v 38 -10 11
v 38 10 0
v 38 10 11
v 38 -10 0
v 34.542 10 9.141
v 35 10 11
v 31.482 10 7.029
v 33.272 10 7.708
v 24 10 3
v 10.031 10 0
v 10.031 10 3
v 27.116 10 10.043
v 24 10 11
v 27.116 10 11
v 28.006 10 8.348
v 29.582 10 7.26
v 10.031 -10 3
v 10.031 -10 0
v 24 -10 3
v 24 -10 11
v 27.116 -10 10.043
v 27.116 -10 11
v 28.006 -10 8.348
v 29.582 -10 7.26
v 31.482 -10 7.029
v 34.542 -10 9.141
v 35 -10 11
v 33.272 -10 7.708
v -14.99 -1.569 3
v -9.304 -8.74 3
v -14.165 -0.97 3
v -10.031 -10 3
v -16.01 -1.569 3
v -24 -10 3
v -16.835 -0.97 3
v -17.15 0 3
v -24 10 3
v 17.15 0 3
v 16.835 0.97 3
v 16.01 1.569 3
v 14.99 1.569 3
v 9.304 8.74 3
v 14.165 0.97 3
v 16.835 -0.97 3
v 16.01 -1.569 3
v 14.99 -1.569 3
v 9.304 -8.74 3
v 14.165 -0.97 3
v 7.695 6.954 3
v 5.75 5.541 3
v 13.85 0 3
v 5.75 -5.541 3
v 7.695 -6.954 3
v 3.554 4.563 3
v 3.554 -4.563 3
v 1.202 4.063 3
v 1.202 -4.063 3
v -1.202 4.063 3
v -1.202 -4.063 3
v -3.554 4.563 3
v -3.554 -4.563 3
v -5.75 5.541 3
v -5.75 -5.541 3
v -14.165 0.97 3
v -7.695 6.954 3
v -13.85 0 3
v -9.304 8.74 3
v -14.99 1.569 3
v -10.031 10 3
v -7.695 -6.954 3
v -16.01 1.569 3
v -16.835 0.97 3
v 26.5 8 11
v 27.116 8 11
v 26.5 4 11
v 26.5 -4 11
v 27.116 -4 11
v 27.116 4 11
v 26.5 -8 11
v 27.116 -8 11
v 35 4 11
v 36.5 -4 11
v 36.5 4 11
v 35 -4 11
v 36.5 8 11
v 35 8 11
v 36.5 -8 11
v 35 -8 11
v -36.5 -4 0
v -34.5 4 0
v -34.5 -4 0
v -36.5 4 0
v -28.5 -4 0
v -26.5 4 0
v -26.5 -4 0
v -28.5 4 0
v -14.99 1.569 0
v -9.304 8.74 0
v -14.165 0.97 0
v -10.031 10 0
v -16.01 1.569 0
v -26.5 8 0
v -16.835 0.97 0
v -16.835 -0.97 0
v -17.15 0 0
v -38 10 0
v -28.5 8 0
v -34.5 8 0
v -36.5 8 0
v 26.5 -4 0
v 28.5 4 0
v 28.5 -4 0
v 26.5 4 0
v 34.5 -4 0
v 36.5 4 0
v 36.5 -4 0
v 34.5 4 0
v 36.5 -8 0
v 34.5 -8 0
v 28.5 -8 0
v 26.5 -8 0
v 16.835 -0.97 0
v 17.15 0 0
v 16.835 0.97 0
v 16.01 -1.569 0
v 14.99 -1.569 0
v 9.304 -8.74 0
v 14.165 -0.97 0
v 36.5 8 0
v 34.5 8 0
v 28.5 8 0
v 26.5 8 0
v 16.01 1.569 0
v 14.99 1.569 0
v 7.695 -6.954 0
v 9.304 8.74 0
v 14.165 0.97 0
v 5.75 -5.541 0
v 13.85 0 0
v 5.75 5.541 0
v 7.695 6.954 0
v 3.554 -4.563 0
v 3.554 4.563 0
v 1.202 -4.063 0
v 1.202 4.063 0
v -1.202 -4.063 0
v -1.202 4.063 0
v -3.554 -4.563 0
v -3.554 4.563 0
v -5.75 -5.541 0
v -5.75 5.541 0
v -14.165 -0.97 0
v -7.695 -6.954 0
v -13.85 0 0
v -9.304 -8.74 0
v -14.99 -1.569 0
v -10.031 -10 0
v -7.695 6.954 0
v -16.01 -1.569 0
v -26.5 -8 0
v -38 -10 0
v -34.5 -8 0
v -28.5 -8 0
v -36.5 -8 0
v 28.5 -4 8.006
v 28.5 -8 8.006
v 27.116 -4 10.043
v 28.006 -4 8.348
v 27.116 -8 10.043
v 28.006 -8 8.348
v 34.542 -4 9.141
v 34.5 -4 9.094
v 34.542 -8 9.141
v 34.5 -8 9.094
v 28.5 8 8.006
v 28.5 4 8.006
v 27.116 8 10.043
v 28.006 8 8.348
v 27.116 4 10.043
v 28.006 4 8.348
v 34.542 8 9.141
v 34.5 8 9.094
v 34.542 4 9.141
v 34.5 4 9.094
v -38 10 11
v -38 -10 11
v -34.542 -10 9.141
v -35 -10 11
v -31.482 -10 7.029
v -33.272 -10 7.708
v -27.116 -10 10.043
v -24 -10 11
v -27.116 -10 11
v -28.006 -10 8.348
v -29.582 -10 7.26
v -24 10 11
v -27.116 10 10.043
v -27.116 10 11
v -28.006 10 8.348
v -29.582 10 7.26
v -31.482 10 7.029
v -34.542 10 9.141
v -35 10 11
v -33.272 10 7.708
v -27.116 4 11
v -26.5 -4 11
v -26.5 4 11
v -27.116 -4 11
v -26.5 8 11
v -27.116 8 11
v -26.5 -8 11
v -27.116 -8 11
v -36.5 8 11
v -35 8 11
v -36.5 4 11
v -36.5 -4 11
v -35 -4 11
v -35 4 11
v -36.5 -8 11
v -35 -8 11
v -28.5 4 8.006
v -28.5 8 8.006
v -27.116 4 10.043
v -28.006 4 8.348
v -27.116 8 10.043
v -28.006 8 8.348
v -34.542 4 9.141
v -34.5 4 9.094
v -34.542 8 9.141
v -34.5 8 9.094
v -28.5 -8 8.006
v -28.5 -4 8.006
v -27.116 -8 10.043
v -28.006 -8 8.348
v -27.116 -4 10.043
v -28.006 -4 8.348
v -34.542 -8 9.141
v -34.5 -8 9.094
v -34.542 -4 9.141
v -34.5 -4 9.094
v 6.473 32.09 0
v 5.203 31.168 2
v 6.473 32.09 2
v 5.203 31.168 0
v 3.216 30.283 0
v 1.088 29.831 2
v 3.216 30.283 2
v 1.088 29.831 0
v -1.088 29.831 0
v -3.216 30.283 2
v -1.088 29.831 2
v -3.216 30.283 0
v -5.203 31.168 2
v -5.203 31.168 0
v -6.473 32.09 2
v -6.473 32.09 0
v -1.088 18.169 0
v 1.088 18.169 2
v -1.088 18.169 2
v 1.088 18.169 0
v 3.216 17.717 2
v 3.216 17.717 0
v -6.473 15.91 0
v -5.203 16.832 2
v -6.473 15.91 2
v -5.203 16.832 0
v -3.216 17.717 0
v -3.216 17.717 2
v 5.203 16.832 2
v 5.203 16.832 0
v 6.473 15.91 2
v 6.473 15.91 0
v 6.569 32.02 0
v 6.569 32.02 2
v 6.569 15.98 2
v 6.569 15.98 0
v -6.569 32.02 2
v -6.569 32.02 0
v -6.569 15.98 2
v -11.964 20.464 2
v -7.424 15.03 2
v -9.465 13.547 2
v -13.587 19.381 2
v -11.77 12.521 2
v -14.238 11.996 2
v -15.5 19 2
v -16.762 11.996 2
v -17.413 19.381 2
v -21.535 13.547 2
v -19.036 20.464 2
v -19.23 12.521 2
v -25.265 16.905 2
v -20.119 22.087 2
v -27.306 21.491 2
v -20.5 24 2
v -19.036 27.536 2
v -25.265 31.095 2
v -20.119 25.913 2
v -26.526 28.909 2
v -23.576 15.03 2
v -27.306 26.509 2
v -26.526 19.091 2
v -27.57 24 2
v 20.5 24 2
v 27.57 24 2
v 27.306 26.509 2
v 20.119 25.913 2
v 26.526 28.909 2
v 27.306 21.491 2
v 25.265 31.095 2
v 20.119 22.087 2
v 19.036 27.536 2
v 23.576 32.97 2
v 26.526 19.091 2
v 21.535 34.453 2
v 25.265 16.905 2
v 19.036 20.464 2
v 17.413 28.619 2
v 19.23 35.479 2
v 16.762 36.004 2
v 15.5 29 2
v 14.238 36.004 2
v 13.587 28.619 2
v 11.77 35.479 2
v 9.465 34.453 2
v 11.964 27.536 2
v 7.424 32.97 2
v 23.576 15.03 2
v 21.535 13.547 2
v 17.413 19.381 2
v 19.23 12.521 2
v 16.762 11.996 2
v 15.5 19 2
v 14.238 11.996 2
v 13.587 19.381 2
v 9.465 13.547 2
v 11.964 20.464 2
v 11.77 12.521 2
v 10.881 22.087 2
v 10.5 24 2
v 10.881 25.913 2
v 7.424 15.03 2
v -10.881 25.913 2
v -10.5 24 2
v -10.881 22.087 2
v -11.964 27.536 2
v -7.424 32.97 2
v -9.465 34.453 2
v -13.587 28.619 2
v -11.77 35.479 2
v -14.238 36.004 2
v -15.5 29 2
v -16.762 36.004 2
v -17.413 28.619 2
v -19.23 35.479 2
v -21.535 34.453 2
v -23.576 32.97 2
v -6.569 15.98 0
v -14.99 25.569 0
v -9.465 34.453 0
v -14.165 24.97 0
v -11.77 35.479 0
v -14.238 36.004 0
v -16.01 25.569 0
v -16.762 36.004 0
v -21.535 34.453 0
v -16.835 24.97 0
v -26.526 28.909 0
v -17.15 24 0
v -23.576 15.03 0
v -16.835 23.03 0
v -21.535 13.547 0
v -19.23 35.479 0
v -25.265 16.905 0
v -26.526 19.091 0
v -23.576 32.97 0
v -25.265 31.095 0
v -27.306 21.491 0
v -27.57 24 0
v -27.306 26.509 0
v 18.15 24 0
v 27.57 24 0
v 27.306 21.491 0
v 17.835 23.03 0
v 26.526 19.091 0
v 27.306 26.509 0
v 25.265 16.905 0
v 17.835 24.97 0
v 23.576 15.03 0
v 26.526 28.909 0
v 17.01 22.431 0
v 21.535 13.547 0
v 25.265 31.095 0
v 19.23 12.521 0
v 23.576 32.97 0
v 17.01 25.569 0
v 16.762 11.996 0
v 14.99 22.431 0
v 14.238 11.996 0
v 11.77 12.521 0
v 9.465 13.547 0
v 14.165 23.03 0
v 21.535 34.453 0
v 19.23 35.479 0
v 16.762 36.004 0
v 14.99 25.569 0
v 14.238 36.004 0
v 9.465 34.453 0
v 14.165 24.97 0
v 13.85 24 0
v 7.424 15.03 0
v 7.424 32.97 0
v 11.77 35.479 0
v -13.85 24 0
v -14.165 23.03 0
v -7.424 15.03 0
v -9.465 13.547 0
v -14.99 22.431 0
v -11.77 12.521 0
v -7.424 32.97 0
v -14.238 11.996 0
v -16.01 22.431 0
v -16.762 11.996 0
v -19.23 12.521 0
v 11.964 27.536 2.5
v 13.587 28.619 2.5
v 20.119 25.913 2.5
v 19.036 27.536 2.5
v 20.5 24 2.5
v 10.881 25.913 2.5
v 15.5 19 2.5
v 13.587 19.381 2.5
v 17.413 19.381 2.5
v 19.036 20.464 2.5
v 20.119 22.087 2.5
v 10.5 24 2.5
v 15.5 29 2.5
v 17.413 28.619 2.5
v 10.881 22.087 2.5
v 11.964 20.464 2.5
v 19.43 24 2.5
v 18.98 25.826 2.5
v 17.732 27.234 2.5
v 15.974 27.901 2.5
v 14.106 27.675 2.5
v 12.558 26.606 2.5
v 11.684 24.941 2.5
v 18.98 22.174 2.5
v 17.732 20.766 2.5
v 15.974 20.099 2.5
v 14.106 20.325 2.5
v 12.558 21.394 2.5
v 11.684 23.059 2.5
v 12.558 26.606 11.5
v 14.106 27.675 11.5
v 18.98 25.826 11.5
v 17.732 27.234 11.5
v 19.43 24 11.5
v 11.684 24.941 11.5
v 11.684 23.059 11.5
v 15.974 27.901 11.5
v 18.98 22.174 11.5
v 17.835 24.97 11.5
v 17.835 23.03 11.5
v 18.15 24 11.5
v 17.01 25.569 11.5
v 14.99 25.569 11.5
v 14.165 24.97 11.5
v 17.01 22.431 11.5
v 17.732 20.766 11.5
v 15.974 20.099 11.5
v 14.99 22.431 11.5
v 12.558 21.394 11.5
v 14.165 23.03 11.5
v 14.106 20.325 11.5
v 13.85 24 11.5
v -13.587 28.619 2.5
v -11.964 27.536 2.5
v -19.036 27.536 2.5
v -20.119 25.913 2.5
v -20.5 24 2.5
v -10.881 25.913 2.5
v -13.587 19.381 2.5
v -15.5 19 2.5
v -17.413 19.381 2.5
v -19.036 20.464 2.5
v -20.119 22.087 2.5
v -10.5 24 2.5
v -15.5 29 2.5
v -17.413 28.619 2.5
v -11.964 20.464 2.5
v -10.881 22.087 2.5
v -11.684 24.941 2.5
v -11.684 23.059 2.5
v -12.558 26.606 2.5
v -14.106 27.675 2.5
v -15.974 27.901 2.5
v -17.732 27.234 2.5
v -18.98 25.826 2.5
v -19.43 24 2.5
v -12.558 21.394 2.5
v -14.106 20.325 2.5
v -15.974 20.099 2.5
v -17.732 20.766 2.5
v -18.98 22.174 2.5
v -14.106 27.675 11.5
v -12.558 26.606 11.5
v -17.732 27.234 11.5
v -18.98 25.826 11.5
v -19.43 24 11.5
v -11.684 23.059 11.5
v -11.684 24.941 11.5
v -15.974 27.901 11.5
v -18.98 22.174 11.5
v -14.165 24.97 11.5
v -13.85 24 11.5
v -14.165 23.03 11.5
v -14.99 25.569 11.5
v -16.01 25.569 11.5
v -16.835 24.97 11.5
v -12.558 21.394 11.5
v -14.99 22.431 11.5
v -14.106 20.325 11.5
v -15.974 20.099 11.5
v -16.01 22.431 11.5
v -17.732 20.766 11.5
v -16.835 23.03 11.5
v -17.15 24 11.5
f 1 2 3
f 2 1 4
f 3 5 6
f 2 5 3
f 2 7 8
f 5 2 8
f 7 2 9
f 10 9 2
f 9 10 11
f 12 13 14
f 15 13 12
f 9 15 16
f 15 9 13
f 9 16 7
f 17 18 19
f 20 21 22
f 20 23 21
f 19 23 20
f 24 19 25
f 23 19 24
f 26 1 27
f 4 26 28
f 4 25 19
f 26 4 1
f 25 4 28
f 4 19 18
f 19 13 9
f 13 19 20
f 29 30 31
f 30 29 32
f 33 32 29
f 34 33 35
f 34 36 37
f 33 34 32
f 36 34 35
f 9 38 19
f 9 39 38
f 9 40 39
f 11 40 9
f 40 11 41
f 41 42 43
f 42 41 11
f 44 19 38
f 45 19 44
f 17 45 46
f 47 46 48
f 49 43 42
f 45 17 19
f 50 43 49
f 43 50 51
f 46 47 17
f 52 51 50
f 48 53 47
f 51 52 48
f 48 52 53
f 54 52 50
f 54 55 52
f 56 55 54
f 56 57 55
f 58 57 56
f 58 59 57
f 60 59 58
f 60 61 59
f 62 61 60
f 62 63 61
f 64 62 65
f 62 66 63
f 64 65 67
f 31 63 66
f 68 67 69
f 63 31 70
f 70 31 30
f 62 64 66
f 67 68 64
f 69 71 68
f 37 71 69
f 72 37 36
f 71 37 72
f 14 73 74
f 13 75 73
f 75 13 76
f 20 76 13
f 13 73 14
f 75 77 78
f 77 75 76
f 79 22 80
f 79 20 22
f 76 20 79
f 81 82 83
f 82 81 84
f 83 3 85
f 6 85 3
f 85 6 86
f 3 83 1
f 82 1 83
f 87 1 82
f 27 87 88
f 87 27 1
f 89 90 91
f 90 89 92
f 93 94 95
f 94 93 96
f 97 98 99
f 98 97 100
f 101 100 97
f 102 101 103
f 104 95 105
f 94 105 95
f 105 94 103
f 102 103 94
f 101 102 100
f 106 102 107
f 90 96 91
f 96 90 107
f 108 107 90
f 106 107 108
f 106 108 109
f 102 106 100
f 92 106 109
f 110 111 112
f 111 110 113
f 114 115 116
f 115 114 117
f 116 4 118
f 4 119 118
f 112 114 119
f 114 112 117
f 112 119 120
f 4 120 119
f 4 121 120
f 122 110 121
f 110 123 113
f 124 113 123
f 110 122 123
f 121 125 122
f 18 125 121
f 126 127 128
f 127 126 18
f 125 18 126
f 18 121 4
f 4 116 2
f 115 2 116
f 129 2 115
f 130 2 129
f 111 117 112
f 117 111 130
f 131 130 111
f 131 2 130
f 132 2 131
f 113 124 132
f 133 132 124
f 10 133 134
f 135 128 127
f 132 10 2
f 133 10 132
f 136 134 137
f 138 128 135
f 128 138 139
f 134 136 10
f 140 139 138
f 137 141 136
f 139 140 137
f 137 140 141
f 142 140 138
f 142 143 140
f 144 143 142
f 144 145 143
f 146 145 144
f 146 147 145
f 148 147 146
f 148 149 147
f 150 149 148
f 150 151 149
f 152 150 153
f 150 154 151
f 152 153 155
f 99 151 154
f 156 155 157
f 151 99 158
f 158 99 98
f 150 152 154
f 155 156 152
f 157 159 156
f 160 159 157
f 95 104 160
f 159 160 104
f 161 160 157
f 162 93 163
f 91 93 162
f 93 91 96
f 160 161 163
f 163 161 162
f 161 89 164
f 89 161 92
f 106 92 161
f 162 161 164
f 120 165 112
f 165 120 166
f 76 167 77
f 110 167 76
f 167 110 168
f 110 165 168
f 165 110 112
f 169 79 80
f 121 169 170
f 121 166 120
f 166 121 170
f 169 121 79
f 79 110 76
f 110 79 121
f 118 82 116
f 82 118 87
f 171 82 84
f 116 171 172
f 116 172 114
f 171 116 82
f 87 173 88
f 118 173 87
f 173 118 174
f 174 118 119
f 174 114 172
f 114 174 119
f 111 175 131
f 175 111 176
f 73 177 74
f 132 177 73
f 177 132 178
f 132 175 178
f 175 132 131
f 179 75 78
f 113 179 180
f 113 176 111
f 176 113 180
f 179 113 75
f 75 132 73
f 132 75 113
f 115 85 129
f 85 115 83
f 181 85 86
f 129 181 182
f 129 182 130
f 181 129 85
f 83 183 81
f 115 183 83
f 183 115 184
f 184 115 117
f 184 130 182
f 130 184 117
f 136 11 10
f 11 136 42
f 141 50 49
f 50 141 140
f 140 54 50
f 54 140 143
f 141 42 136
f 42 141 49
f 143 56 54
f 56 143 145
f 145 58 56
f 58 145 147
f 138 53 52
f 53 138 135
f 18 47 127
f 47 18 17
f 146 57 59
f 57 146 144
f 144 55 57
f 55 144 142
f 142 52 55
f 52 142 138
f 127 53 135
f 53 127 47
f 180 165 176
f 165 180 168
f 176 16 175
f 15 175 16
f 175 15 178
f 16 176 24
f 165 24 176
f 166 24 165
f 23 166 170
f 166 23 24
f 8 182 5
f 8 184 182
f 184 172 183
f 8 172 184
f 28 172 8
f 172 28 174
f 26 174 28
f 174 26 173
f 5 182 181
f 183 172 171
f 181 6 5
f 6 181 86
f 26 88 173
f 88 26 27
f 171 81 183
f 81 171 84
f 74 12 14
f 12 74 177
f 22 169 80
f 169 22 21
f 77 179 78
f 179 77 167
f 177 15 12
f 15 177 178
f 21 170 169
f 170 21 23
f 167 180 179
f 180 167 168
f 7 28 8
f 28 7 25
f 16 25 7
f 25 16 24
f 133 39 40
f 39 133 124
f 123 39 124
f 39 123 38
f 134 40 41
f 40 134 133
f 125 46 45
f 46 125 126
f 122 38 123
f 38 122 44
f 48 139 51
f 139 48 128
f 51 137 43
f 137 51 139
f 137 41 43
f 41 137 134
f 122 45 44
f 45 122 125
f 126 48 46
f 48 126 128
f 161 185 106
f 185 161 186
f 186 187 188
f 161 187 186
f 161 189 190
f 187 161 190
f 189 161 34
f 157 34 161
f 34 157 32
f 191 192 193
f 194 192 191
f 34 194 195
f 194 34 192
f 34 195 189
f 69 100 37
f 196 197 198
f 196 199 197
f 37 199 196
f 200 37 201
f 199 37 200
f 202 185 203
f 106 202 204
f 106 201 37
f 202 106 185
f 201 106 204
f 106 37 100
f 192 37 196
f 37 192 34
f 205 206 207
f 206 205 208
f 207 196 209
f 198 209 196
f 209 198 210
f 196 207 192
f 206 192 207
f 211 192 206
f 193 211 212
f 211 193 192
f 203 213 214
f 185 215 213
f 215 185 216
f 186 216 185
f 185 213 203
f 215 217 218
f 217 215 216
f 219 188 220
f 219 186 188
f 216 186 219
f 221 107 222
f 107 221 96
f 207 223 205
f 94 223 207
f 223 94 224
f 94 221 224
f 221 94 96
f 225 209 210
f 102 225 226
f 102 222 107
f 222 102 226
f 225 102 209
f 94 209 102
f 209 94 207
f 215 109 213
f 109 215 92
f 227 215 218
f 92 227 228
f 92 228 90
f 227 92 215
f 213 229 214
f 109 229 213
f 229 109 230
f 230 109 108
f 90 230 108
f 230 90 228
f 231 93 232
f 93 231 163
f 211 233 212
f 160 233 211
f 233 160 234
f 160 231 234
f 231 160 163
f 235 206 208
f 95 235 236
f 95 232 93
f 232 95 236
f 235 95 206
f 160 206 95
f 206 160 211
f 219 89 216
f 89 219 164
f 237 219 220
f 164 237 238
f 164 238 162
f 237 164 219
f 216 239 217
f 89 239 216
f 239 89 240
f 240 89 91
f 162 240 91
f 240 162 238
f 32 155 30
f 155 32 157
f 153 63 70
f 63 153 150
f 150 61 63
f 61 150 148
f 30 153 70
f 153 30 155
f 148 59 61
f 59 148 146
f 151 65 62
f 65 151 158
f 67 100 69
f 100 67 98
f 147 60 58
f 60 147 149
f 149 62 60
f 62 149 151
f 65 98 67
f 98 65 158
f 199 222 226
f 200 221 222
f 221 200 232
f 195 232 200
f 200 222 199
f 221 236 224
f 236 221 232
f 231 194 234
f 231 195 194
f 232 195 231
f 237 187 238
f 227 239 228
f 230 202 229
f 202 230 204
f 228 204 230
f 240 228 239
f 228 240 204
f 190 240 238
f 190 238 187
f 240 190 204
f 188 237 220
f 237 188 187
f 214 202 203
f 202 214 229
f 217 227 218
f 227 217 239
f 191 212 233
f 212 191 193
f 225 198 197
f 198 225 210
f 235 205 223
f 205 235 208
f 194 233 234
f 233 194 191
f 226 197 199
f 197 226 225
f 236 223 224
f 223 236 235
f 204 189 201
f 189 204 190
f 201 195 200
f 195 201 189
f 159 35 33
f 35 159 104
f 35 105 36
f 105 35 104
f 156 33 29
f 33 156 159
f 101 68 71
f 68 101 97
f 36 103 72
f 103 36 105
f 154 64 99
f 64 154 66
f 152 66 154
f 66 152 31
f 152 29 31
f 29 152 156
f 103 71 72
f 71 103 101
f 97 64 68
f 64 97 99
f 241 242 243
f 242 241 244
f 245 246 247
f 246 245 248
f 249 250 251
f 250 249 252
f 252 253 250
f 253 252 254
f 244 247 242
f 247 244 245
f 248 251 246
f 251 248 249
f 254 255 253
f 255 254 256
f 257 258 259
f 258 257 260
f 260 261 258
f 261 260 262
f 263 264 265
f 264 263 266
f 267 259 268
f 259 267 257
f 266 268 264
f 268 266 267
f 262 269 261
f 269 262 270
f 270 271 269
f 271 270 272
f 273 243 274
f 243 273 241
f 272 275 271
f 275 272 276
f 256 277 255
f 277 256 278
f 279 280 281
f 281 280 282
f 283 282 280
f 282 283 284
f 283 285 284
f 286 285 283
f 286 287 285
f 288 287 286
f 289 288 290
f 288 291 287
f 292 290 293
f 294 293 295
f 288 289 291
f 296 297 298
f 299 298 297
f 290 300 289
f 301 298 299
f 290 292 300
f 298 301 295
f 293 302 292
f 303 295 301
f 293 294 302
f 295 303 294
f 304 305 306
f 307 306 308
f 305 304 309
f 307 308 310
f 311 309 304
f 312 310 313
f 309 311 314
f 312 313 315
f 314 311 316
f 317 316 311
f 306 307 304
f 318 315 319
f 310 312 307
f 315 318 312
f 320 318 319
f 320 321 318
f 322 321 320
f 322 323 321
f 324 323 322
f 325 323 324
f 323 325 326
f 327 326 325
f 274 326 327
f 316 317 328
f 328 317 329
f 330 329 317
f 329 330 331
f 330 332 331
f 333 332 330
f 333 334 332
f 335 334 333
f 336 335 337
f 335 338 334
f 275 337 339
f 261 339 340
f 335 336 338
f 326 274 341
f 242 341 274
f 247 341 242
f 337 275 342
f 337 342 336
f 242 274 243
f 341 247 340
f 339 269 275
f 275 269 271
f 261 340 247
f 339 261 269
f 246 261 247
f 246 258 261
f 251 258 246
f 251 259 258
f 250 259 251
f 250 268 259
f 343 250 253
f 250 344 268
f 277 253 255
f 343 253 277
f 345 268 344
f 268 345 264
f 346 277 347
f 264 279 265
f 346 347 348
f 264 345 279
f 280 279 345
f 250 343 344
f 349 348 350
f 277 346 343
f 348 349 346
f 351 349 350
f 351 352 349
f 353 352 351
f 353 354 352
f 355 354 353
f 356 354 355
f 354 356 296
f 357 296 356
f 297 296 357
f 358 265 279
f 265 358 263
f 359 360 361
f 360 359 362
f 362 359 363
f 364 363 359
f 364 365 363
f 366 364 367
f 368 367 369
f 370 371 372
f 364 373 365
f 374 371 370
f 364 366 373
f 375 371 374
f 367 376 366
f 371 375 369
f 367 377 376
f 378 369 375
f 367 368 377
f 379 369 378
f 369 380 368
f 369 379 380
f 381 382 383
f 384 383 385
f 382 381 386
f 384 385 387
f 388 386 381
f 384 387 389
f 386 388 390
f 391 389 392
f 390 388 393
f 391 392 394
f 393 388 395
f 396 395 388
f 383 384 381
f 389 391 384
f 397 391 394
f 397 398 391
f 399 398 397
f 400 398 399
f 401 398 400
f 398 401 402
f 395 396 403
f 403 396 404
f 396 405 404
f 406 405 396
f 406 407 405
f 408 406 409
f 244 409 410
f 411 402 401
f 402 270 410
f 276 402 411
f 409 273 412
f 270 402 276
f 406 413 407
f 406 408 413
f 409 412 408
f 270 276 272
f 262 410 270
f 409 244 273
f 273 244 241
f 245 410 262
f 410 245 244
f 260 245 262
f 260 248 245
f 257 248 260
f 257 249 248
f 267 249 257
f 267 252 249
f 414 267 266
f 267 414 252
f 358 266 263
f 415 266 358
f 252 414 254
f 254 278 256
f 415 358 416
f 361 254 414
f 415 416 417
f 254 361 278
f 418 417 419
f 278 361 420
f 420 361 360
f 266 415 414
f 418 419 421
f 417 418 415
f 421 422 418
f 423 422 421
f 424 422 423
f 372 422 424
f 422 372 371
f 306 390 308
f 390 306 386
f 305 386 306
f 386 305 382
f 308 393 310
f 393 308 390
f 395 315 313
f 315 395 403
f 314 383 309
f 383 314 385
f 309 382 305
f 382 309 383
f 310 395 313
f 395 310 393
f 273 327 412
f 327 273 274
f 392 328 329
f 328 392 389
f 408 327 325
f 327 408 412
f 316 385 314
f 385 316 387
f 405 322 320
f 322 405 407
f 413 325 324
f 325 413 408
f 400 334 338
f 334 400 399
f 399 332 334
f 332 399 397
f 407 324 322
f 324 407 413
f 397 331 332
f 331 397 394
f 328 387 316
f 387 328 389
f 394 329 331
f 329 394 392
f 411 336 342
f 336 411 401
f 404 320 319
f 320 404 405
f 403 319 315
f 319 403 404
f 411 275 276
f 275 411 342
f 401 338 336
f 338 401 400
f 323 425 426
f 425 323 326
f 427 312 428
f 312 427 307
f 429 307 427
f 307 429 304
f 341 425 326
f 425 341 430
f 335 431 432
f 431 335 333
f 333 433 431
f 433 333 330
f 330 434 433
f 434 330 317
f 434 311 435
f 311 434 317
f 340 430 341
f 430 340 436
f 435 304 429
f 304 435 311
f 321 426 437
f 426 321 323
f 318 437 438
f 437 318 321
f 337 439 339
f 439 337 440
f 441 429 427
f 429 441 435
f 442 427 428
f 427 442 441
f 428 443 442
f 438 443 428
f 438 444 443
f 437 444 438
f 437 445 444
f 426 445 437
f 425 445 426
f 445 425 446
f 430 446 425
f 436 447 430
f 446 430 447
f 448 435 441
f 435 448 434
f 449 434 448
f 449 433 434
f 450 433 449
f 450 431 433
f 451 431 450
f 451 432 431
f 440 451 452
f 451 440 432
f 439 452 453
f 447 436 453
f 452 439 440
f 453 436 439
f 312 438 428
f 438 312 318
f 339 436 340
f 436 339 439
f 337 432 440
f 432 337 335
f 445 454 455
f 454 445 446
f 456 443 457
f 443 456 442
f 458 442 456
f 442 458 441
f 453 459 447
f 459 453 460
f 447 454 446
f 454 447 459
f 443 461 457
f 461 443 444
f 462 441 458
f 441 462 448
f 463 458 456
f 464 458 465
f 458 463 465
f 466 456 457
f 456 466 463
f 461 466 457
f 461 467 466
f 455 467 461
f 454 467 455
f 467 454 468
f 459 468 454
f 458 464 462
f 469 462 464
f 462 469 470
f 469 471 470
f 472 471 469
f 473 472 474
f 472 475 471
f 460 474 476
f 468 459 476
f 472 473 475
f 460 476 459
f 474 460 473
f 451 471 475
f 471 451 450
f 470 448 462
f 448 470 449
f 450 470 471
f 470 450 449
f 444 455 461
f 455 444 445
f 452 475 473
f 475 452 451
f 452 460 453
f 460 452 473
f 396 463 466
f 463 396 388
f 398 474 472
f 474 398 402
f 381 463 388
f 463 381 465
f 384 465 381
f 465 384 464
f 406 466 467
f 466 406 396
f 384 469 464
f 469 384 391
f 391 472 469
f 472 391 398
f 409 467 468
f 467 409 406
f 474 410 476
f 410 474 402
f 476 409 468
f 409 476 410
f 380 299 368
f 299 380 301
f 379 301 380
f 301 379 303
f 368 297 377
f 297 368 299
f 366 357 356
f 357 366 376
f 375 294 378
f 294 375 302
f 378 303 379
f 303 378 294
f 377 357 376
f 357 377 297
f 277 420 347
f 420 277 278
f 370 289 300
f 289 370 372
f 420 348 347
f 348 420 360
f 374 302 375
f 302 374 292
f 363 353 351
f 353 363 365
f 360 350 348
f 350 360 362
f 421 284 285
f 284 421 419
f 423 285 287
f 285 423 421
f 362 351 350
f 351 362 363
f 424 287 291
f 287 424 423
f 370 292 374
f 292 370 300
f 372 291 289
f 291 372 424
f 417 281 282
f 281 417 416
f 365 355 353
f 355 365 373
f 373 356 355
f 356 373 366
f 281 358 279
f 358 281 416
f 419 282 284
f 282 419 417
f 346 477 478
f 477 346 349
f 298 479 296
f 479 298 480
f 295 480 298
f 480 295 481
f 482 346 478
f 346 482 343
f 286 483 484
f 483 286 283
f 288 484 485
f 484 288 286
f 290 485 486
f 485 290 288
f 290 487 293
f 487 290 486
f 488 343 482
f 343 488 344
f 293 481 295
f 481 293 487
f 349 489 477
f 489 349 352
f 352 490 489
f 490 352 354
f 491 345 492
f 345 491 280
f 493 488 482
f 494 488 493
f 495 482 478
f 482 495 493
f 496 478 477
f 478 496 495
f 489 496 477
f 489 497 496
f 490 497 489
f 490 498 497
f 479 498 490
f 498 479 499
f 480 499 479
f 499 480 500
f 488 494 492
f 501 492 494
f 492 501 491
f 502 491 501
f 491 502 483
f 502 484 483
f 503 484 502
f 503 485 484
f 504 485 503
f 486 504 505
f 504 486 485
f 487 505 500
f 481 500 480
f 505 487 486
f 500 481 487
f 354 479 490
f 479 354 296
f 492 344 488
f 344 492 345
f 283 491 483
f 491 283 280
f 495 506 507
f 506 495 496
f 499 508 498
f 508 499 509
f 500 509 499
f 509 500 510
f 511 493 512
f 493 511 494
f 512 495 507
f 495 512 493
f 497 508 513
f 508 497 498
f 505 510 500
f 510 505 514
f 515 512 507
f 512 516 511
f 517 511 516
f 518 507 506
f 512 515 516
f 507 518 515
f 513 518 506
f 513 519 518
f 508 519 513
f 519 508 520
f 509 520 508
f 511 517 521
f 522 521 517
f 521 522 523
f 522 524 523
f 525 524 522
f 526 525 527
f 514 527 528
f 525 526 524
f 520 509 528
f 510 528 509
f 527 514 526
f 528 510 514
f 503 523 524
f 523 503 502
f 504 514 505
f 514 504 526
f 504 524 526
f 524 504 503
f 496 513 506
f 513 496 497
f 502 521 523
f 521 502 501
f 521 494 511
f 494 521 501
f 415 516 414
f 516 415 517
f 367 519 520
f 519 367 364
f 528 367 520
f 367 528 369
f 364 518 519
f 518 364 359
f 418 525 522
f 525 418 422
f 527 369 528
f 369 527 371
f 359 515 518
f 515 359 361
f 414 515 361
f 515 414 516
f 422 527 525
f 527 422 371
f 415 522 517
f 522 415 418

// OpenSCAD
bearing_height = 7 + 1;
bearing_radius = 22;
bearing_hole = 8;
tolerance = 0.07;

nema_hole_diameter = 3;
nema_tolerance = 0.15;

rod_hole = 8;
rod_distance = 62; // Wallace = 62 ; Printrbot = 60
nema_hole_distance = 31;

// mount holes for zipties distance
mountdist = rod_distance - rod_hole;
zipperspacing = rod_hole;
zipperwidth = 4;
zipperlength = 2;

// extra holes
mountdist2 = 43;

width = 20;
height = 8;
plateau_height = 3;
flesh = 3;

// flange parameters ; modify t_y to change appearance
t_x = nema_hole_distance / 2;
t_y = 10 * 1.618033;
t_r = bearing_radius / 2 + 1;


// Gallery of these parts
//y_mount(0);
//translate([0, width + flesh + 1, 0]) 
y_mount(1);
translate([0,  (width + flesh + 1), 0])
y_retainer();


module y_retainer() {

	module halfretainer() {
		difference() {
			union() {

				//rotate([90, 0, 0]) {

				// rounded flange
				difference() {
					cylinder(r = sqrt(pow(t_x, 2) + pow(t_y, 2)) - t_r, h = 2);

					for (z = [0, 1]) {
						mirror([0, z, 0]) {
							translate([0, t_y, -0.1])
							cylinder(r = sqrt(pow(t_x, 2) + pow(t_y, 2)) - t_r, h = 2 + 2 * 0.1);
						}
					}
				}

				translate([nema_hole_distance / 2, 0, 0]) {
					// base plate
					cylinder(h = 2, r = bearing_radius / 2 + 1 + tolerance);

					// nema mouting cylinders
					cylinder(h = 2 + 0.5, r = bearing_hole / 2 + 1);

					// nema mouting cylinders : 2=base plate, 1.5=extra M8 washer
					cylinder(h = bearing_height + 2 + 1.5, r = bearing_hole / 2 - tolerance);

				}
				//}
			}


		}

	}

	difference(){
		halfretainer();
		// nema screw hole, with little hull for tolerance
		hull(){
			translate([nema_hole_distance / 2, 0,  - .1]) # cylinder(h = bearing_height + 2 + 1.5 + 2 * .1, r = nema_hole_diameter / 2 + nema_tolerance,$fn=10);
			translate([nema_hole_distance / 2+1, 0,  - .1]) # cylinder(h = bearing_height + 2 + 1.5 + 2 * .1, r = nema_hole_diameter / 2 + nema_tolerance,$fn=10);
		}
	}

	mirror([1, 0, 0]) {
		difference(){
		halfretainer();
		// nema screw hole
		translate([nema_hole_distance / 2, 0,  - .1]) # cylinder(h = bearing_height + 2 + 1.5 + 2 * .1, r = nema_hole_diameter / 2 + nema_tolerance,$fn=10);
	}

	}

}

// parameters : nema_attached (0/1) : nema motor attached to the mount , or not ?
module y_mount(nema_attached=1) {

	module halfmount() {
		translate([0, -plateau_height, 0]) {
			difference() {

				difference() {

					union() {
						// rod hole block
						translate([rod_distance / 2 - rod_hole / 2 - flesh, -rod_hole / 2 - height / 2, -width / 2])
						cube([rod_hole + flesh * 2, rod_hole / 2 + height / 2, width]);

						// base
						translate([0, 0,  - width / 2])
						cube([rod_distance / 2 + rod_hole / 2 + flesh, plateau_height, width]);

						if (nema_attached == 0) {
							// if NEMA not attached , create a mounting block to support the screws
							// nema mouting cylinders
							translate([nema_hole_distance / 2, 0, 0])
							rotate([90, 0, 0])
							cylinder(h = height, r = nema_hole_diameter / 2 + nema_tolerance + 2);

							// nema mounting block
							translate([0, -height, -nema_hole_diameter])
							cube([rod_distance / 2, height, nema_hole_diameter * 2]);
						}
					}

					//translate([0, -height*1.5, - zipperwidth /2 ])
					//cube([rod_distance/2 + rod_hole/2 ,height,zipperwidth]);


				}

				// rod hole
				translate([rod_distance / 2,  - rod_hole / 2 - height / 2, -width])
				cylinder(r = rod_hole / 2, h = width * 2);

				for (z = [-width / 2 + zipperwidth, width / 2 - zipperwidth]) // two iterations, z = -1, z = 1
				{

					//ziptie holes around rods
					translate([mountdist / 2 - 1 / 2, -10, -zipperwidth / 2 + z])
					cube([zipperlength, 30, zipperwidth]);
					translate([mountdist / 2 - 1 / 2 + zipperspacing, -10, -zipperwidth / 2 + z])
					cube([zipperlength, 30, zipperwidth]);
				}
				// nema mouting holes
				translate([nema_hole_distance / 2, 10, 0])
				rotate([90, 0, 0])
				cylinder(h = 50, r = nema_hole_diameter / 2 + nema_tolerance,$fn=10);

				if (nema_attached == 1) {
					// make room for NEMA motor head
					for (z = [0, 1]) {
						mirror([0, 0, z]) {
							translate([0, plateau_height + .1, nema_hole_distance / 2]) {
								rotate([90, 0, 0])
								cylinder(h = plateau_height + .2, r = 23 / 2);
							}
						}
					}
				}

			}
		}

	}
	rotate([-90, 0, 0]) {
		halfmount();
		rotate(180, [0, 1, 0])
		halfmount();
	}

}
